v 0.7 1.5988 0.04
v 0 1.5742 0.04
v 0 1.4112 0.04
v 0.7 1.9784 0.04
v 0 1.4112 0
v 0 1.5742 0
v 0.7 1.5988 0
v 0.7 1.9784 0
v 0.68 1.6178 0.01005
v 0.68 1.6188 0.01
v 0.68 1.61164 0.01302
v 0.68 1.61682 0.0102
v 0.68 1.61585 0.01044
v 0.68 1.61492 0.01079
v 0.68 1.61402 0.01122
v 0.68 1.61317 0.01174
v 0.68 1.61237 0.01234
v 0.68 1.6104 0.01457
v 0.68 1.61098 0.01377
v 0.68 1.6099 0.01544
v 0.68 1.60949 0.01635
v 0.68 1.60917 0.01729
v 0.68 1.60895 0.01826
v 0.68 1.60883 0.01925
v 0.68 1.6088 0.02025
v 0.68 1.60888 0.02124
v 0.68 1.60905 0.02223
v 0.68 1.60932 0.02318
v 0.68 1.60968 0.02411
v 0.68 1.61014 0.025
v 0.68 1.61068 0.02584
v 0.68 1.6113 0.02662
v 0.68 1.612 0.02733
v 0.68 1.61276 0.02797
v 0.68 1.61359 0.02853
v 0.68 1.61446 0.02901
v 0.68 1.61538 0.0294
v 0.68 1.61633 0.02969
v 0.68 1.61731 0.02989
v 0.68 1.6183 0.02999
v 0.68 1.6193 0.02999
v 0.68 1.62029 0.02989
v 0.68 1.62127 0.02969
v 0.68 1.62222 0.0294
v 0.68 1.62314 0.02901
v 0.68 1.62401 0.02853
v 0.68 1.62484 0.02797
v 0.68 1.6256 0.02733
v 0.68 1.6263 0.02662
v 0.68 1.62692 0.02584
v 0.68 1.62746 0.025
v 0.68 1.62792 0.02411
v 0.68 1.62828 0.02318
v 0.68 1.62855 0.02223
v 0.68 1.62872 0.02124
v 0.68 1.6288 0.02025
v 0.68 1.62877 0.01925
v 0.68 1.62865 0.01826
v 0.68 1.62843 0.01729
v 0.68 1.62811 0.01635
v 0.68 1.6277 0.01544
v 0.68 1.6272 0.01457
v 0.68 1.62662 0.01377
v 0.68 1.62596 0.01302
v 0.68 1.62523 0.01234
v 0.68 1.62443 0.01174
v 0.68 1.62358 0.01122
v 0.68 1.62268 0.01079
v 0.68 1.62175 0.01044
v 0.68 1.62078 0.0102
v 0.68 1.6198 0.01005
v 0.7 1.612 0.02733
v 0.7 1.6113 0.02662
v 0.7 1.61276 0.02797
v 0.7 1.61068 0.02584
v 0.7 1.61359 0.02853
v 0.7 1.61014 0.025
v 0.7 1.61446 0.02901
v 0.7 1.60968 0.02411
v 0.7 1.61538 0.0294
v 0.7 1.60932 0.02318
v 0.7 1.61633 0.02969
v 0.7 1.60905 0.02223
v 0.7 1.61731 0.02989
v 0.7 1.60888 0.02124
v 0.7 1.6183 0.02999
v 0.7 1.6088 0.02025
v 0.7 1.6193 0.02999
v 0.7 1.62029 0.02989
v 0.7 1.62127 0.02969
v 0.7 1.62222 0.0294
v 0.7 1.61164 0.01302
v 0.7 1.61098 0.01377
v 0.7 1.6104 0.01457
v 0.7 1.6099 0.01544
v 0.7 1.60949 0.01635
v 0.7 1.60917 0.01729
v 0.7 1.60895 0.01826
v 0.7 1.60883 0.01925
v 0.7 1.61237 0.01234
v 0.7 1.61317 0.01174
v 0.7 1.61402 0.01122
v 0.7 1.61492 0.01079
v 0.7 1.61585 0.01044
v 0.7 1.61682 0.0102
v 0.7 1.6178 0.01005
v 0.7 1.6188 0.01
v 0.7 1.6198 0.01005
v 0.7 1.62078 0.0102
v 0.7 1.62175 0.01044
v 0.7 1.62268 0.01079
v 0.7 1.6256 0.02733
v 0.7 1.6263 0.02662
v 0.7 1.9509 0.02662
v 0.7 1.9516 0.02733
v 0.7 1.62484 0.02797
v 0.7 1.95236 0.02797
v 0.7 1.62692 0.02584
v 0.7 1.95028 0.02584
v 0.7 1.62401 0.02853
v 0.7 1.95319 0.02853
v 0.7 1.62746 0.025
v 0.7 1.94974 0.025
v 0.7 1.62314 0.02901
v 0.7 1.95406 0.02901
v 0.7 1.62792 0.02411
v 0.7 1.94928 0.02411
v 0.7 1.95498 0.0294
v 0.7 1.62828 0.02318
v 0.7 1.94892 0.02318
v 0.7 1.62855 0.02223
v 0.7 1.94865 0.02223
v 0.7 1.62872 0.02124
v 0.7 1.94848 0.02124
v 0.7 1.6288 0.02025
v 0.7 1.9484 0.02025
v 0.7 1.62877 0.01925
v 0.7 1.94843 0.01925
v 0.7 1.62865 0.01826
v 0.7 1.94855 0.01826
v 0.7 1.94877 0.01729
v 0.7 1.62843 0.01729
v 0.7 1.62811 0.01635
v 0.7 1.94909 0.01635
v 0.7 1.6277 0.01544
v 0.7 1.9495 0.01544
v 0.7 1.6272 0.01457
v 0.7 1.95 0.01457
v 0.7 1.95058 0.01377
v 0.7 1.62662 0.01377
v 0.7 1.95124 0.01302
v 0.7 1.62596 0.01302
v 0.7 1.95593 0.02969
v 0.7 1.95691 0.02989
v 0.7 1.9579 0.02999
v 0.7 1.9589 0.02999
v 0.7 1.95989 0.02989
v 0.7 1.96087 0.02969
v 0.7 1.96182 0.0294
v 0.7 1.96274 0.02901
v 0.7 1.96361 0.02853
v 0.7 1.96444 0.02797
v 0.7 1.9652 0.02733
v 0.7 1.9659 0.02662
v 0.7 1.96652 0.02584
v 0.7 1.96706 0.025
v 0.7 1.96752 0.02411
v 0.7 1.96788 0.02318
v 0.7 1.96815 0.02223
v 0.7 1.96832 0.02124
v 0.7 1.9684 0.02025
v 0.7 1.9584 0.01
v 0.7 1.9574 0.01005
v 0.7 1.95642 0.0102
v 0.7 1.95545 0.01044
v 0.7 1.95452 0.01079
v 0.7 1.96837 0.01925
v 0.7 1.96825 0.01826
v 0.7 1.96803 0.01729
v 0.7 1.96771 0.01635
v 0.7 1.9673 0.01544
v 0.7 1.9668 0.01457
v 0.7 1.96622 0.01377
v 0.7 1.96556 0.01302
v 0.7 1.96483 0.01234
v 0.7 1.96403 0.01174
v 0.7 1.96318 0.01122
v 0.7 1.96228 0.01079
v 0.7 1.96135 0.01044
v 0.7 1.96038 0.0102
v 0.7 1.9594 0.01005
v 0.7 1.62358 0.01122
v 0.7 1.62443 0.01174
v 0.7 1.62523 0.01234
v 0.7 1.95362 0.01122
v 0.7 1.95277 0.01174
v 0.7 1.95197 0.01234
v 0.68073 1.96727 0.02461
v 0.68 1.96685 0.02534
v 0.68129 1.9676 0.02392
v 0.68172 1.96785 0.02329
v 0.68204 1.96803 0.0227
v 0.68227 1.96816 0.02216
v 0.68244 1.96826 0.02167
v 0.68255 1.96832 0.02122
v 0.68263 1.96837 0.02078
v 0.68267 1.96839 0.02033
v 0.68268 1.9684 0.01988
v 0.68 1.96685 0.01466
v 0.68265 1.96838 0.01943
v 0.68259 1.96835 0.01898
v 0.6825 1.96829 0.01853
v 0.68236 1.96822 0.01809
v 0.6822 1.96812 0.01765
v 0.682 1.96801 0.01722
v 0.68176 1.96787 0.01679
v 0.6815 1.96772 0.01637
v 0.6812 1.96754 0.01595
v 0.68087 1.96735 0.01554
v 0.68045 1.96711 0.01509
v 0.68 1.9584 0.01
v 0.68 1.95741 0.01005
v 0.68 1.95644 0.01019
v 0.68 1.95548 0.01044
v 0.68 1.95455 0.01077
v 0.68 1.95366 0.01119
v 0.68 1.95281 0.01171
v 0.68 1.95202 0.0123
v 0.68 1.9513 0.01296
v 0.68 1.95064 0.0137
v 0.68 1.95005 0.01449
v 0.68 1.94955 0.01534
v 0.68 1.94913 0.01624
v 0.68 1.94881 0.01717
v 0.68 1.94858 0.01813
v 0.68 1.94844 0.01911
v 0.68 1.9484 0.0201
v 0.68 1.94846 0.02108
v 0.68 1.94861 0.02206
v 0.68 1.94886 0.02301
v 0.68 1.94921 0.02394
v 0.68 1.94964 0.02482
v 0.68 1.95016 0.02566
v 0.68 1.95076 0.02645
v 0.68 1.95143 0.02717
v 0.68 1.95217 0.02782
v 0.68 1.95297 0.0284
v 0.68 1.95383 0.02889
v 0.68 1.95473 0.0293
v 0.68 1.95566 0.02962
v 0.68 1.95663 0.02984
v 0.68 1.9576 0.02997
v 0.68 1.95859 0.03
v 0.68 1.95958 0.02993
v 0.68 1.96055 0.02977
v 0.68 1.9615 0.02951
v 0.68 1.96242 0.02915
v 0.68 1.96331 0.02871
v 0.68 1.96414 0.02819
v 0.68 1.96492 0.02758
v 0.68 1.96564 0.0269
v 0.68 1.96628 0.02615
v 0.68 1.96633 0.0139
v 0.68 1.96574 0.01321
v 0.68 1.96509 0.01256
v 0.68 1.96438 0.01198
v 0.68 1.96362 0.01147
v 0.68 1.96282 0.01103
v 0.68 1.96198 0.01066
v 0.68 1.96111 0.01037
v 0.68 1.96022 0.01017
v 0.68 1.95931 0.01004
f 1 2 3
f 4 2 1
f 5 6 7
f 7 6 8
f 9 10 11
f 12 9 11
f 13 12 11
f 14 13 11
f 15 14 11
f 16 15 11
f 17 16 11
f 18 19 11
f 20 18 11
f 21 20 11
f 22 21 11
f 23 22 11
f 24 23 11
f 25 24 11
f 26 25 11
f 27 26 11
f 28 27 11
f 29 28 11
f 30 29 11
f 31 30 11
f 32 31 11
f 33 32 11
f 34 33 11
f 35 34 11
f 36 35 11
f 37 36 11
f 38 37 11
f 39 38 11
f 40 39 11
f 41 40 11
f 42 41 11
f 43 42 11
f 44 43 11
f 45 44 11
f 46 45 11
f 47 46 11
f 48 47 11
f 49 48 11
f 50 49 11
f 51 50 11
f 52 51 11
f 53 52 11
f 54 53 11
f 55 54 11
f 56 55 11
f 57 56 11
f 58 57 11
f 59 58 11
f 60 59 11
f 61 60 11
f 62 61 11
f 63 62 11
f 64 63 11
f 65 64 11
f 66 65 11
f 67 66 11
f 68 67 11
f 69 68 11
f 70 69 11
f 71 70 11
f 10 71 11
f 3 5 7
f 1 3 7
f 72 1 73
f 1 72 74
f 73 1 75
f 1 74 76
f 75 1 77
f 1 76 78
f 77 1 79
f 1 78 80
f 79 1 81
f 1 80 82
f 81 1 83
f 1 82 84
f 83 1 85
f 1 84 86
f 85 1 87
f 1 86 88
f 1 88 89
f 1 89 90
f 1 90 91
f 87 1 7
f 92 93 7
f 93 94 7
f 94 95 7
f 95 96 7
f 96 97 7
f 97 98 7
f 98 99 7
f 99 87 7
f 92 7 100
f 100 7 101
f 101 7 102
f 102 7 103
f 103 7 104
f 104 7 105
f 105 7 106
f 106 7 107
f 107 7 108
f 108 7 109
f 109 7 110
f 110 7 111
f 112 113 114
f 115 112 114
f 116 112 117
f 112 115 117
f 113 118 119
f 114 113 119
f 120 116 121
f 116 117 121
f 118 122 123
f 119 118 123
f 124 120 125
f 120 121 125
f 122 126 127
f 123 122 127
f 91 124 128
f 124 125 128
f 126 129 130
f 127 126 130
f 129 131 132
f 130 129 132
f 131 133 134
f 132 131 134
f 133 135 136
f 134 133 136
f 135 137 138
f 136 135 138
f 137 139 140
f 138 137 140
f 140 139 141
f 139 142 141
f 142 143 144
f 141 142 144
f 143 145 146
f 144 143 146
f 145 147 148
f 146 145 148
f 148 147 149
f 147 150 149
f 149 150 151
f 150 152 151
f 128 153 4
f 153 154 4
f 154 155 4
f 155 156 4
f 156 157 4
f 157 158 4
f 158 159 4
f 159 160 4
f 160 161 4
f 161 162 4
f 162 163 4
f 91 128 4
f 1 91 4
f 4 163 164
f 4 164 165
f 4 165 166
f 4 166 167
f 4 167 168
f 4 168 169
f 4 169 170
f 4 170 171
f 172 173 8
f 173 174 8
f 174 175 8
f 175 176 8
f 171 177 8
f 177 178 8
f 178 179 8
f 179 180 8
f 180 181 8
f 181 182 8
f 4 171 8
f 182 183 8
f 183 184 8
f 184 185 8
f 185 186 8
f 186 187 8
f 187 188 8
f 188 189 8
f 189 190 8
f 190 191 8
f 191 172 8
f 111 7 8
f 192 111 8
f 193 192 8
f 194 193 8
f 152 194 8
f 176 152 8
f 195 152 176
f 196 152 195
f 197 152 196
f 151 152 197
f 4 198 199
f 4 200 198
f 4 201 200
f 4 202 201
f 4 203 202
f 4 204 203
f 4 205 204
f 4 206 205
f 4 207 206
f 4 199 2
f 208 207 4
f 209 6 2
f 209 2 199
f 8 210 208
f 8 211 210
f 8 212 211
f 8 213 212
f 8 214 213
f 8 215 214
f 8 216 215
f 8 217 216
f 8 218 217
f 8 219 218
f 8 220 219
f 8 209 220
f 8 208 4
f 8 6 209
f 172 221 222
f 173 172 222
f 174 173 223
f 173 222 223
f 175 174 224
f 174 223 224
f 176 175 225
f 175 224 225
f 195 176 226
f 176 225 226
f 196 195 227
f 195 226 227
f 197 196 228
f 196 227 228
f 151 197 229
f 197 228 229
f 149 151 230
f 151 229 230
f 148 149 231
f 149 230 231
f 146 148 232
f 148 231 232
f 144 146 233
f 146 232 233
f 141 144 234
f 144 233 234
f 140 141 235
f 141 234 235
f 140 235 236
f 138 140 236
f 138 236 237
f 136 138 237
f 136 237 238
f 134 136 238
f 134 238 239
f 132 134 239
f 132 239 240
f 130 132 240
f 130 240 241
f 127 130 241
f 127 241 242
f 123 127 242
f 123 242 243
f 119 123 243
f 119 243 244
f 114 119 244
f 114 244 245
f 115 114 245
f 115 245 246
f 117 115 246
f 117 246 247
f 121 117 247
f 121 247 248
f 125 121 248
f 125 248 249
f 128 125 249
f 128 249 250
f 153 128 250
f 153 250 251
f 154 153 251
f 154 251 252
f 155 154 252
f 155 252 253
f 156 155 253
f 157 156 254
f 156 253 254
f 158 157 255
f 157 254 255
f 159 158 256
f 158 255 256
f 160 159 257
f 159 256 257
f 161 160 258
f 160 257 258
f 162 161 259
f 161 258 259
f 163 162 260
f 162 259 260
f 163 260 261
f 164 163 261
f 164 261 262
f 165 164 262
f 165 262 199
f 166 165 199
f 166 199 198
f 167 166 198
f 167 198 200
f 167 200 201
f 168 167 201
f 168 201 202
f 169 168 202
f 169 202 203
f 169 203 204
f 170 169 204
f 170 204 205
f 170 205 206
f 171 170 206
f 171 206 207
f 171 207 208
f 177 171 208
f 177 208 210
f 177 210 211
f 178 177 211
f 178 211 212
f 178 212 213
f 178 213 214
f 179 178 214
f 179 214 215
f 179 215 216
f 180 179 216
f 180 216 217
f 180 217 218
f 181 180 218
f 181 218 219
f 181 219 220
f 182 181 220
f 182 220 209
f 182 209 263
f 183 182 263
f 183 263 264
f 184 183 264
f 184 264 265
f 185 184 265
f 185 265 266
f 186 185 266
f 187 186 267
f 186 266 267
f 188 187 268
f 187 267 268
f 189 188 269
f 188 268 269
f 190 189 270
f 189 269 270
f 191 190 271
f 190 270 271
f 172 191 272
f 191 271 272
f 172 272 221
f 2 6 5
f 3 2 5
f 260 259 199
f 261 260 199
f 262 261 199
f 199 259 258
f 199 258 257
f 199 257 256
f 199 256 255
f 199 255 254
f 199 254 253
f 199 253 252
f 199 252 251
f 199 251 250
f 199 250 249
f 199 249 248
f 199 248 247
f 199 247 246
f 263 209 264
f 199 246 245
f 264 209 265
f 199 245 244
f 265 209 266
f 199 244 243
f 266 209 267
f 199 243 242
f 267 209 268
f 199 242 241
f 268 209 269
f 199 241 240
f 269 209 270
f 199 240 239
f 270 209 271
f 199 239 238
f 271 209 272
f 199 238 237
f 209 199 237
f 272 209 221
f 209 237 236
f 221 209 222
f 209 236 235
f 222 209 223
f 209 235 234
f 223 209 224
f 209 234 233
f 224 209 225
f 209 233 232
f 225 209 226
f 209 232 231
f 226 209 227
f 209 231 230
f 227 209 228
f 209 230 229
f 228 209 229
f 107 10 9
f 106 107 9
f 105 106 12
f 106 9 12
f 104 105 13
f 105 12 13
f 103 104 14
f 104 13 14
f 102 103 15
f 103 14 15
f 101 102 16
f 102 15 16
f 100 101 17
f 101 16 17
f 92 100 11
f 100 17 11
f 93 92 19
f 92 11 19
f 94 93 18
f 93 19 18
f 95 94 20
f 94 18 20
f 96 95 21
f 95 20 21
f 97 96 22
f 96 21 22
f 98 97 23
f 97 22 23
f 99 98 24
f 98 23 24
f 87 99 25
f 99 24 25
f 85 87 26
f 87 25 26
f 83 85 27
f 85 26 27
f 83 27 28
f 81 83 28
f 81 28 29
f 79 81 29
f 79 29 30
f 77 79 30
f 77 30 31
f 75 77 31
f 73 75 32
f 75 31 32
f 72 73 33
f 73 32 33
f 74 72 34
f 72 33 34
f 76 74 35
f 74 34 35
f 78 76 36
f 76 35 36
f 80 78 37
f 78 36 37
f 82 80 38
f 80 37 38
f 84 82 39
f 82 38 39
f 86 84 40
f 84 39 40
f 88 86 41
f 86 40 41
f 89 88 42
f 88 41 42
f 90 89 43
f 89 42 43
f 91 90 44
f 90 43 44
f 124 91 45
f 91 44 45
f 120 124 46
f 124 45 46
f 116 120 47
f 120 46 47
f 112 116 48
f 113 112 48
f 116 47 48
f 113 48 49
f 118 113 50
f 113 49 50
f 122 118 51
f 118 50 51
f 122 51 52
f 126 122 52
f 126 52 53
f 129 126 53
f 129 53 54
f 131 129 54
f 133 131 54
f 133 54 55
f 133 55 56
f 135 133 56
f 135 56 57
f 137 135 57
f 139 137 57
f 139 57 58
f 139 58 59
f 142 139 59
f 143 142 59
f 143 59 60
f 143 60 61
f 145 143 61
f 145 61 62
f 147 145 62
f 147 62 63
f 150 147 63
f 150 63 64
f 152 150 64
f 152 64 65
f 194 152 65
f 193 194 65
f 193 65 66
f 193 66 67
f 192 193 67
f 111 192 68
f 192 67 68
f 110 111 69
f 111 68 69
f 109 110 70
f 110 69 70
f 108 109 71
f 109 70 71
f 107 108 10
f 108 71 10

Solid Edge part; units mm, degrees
sketch "Sketch1" plane through (0, 0, 0) normal (0, 0, 1) x (1, 0, 0)
  line L0 (0, 1.5742) -> (0, 1.4112)
  line L1 (0, 1.4112) -> (0.7, 1.5988)
  line L2 (0.7, 1.5988) -> (0.7, 1.9784)
  line L3 (0, 1.5742) -> (0.7, 1.9784)
extrude "Protrusion1" add sketch "Sketch1" along normal blind 0.04
hole "Bohrung_7" at (0.7, 1.6188, 0.02) direction (-1, 0, 0) diameter 0.02 depth 0.02
hole "Hole1" at (0.7, 1.9584, 0.02) direction (-1, 0, 0) diameter 0.02 depth 0.02
